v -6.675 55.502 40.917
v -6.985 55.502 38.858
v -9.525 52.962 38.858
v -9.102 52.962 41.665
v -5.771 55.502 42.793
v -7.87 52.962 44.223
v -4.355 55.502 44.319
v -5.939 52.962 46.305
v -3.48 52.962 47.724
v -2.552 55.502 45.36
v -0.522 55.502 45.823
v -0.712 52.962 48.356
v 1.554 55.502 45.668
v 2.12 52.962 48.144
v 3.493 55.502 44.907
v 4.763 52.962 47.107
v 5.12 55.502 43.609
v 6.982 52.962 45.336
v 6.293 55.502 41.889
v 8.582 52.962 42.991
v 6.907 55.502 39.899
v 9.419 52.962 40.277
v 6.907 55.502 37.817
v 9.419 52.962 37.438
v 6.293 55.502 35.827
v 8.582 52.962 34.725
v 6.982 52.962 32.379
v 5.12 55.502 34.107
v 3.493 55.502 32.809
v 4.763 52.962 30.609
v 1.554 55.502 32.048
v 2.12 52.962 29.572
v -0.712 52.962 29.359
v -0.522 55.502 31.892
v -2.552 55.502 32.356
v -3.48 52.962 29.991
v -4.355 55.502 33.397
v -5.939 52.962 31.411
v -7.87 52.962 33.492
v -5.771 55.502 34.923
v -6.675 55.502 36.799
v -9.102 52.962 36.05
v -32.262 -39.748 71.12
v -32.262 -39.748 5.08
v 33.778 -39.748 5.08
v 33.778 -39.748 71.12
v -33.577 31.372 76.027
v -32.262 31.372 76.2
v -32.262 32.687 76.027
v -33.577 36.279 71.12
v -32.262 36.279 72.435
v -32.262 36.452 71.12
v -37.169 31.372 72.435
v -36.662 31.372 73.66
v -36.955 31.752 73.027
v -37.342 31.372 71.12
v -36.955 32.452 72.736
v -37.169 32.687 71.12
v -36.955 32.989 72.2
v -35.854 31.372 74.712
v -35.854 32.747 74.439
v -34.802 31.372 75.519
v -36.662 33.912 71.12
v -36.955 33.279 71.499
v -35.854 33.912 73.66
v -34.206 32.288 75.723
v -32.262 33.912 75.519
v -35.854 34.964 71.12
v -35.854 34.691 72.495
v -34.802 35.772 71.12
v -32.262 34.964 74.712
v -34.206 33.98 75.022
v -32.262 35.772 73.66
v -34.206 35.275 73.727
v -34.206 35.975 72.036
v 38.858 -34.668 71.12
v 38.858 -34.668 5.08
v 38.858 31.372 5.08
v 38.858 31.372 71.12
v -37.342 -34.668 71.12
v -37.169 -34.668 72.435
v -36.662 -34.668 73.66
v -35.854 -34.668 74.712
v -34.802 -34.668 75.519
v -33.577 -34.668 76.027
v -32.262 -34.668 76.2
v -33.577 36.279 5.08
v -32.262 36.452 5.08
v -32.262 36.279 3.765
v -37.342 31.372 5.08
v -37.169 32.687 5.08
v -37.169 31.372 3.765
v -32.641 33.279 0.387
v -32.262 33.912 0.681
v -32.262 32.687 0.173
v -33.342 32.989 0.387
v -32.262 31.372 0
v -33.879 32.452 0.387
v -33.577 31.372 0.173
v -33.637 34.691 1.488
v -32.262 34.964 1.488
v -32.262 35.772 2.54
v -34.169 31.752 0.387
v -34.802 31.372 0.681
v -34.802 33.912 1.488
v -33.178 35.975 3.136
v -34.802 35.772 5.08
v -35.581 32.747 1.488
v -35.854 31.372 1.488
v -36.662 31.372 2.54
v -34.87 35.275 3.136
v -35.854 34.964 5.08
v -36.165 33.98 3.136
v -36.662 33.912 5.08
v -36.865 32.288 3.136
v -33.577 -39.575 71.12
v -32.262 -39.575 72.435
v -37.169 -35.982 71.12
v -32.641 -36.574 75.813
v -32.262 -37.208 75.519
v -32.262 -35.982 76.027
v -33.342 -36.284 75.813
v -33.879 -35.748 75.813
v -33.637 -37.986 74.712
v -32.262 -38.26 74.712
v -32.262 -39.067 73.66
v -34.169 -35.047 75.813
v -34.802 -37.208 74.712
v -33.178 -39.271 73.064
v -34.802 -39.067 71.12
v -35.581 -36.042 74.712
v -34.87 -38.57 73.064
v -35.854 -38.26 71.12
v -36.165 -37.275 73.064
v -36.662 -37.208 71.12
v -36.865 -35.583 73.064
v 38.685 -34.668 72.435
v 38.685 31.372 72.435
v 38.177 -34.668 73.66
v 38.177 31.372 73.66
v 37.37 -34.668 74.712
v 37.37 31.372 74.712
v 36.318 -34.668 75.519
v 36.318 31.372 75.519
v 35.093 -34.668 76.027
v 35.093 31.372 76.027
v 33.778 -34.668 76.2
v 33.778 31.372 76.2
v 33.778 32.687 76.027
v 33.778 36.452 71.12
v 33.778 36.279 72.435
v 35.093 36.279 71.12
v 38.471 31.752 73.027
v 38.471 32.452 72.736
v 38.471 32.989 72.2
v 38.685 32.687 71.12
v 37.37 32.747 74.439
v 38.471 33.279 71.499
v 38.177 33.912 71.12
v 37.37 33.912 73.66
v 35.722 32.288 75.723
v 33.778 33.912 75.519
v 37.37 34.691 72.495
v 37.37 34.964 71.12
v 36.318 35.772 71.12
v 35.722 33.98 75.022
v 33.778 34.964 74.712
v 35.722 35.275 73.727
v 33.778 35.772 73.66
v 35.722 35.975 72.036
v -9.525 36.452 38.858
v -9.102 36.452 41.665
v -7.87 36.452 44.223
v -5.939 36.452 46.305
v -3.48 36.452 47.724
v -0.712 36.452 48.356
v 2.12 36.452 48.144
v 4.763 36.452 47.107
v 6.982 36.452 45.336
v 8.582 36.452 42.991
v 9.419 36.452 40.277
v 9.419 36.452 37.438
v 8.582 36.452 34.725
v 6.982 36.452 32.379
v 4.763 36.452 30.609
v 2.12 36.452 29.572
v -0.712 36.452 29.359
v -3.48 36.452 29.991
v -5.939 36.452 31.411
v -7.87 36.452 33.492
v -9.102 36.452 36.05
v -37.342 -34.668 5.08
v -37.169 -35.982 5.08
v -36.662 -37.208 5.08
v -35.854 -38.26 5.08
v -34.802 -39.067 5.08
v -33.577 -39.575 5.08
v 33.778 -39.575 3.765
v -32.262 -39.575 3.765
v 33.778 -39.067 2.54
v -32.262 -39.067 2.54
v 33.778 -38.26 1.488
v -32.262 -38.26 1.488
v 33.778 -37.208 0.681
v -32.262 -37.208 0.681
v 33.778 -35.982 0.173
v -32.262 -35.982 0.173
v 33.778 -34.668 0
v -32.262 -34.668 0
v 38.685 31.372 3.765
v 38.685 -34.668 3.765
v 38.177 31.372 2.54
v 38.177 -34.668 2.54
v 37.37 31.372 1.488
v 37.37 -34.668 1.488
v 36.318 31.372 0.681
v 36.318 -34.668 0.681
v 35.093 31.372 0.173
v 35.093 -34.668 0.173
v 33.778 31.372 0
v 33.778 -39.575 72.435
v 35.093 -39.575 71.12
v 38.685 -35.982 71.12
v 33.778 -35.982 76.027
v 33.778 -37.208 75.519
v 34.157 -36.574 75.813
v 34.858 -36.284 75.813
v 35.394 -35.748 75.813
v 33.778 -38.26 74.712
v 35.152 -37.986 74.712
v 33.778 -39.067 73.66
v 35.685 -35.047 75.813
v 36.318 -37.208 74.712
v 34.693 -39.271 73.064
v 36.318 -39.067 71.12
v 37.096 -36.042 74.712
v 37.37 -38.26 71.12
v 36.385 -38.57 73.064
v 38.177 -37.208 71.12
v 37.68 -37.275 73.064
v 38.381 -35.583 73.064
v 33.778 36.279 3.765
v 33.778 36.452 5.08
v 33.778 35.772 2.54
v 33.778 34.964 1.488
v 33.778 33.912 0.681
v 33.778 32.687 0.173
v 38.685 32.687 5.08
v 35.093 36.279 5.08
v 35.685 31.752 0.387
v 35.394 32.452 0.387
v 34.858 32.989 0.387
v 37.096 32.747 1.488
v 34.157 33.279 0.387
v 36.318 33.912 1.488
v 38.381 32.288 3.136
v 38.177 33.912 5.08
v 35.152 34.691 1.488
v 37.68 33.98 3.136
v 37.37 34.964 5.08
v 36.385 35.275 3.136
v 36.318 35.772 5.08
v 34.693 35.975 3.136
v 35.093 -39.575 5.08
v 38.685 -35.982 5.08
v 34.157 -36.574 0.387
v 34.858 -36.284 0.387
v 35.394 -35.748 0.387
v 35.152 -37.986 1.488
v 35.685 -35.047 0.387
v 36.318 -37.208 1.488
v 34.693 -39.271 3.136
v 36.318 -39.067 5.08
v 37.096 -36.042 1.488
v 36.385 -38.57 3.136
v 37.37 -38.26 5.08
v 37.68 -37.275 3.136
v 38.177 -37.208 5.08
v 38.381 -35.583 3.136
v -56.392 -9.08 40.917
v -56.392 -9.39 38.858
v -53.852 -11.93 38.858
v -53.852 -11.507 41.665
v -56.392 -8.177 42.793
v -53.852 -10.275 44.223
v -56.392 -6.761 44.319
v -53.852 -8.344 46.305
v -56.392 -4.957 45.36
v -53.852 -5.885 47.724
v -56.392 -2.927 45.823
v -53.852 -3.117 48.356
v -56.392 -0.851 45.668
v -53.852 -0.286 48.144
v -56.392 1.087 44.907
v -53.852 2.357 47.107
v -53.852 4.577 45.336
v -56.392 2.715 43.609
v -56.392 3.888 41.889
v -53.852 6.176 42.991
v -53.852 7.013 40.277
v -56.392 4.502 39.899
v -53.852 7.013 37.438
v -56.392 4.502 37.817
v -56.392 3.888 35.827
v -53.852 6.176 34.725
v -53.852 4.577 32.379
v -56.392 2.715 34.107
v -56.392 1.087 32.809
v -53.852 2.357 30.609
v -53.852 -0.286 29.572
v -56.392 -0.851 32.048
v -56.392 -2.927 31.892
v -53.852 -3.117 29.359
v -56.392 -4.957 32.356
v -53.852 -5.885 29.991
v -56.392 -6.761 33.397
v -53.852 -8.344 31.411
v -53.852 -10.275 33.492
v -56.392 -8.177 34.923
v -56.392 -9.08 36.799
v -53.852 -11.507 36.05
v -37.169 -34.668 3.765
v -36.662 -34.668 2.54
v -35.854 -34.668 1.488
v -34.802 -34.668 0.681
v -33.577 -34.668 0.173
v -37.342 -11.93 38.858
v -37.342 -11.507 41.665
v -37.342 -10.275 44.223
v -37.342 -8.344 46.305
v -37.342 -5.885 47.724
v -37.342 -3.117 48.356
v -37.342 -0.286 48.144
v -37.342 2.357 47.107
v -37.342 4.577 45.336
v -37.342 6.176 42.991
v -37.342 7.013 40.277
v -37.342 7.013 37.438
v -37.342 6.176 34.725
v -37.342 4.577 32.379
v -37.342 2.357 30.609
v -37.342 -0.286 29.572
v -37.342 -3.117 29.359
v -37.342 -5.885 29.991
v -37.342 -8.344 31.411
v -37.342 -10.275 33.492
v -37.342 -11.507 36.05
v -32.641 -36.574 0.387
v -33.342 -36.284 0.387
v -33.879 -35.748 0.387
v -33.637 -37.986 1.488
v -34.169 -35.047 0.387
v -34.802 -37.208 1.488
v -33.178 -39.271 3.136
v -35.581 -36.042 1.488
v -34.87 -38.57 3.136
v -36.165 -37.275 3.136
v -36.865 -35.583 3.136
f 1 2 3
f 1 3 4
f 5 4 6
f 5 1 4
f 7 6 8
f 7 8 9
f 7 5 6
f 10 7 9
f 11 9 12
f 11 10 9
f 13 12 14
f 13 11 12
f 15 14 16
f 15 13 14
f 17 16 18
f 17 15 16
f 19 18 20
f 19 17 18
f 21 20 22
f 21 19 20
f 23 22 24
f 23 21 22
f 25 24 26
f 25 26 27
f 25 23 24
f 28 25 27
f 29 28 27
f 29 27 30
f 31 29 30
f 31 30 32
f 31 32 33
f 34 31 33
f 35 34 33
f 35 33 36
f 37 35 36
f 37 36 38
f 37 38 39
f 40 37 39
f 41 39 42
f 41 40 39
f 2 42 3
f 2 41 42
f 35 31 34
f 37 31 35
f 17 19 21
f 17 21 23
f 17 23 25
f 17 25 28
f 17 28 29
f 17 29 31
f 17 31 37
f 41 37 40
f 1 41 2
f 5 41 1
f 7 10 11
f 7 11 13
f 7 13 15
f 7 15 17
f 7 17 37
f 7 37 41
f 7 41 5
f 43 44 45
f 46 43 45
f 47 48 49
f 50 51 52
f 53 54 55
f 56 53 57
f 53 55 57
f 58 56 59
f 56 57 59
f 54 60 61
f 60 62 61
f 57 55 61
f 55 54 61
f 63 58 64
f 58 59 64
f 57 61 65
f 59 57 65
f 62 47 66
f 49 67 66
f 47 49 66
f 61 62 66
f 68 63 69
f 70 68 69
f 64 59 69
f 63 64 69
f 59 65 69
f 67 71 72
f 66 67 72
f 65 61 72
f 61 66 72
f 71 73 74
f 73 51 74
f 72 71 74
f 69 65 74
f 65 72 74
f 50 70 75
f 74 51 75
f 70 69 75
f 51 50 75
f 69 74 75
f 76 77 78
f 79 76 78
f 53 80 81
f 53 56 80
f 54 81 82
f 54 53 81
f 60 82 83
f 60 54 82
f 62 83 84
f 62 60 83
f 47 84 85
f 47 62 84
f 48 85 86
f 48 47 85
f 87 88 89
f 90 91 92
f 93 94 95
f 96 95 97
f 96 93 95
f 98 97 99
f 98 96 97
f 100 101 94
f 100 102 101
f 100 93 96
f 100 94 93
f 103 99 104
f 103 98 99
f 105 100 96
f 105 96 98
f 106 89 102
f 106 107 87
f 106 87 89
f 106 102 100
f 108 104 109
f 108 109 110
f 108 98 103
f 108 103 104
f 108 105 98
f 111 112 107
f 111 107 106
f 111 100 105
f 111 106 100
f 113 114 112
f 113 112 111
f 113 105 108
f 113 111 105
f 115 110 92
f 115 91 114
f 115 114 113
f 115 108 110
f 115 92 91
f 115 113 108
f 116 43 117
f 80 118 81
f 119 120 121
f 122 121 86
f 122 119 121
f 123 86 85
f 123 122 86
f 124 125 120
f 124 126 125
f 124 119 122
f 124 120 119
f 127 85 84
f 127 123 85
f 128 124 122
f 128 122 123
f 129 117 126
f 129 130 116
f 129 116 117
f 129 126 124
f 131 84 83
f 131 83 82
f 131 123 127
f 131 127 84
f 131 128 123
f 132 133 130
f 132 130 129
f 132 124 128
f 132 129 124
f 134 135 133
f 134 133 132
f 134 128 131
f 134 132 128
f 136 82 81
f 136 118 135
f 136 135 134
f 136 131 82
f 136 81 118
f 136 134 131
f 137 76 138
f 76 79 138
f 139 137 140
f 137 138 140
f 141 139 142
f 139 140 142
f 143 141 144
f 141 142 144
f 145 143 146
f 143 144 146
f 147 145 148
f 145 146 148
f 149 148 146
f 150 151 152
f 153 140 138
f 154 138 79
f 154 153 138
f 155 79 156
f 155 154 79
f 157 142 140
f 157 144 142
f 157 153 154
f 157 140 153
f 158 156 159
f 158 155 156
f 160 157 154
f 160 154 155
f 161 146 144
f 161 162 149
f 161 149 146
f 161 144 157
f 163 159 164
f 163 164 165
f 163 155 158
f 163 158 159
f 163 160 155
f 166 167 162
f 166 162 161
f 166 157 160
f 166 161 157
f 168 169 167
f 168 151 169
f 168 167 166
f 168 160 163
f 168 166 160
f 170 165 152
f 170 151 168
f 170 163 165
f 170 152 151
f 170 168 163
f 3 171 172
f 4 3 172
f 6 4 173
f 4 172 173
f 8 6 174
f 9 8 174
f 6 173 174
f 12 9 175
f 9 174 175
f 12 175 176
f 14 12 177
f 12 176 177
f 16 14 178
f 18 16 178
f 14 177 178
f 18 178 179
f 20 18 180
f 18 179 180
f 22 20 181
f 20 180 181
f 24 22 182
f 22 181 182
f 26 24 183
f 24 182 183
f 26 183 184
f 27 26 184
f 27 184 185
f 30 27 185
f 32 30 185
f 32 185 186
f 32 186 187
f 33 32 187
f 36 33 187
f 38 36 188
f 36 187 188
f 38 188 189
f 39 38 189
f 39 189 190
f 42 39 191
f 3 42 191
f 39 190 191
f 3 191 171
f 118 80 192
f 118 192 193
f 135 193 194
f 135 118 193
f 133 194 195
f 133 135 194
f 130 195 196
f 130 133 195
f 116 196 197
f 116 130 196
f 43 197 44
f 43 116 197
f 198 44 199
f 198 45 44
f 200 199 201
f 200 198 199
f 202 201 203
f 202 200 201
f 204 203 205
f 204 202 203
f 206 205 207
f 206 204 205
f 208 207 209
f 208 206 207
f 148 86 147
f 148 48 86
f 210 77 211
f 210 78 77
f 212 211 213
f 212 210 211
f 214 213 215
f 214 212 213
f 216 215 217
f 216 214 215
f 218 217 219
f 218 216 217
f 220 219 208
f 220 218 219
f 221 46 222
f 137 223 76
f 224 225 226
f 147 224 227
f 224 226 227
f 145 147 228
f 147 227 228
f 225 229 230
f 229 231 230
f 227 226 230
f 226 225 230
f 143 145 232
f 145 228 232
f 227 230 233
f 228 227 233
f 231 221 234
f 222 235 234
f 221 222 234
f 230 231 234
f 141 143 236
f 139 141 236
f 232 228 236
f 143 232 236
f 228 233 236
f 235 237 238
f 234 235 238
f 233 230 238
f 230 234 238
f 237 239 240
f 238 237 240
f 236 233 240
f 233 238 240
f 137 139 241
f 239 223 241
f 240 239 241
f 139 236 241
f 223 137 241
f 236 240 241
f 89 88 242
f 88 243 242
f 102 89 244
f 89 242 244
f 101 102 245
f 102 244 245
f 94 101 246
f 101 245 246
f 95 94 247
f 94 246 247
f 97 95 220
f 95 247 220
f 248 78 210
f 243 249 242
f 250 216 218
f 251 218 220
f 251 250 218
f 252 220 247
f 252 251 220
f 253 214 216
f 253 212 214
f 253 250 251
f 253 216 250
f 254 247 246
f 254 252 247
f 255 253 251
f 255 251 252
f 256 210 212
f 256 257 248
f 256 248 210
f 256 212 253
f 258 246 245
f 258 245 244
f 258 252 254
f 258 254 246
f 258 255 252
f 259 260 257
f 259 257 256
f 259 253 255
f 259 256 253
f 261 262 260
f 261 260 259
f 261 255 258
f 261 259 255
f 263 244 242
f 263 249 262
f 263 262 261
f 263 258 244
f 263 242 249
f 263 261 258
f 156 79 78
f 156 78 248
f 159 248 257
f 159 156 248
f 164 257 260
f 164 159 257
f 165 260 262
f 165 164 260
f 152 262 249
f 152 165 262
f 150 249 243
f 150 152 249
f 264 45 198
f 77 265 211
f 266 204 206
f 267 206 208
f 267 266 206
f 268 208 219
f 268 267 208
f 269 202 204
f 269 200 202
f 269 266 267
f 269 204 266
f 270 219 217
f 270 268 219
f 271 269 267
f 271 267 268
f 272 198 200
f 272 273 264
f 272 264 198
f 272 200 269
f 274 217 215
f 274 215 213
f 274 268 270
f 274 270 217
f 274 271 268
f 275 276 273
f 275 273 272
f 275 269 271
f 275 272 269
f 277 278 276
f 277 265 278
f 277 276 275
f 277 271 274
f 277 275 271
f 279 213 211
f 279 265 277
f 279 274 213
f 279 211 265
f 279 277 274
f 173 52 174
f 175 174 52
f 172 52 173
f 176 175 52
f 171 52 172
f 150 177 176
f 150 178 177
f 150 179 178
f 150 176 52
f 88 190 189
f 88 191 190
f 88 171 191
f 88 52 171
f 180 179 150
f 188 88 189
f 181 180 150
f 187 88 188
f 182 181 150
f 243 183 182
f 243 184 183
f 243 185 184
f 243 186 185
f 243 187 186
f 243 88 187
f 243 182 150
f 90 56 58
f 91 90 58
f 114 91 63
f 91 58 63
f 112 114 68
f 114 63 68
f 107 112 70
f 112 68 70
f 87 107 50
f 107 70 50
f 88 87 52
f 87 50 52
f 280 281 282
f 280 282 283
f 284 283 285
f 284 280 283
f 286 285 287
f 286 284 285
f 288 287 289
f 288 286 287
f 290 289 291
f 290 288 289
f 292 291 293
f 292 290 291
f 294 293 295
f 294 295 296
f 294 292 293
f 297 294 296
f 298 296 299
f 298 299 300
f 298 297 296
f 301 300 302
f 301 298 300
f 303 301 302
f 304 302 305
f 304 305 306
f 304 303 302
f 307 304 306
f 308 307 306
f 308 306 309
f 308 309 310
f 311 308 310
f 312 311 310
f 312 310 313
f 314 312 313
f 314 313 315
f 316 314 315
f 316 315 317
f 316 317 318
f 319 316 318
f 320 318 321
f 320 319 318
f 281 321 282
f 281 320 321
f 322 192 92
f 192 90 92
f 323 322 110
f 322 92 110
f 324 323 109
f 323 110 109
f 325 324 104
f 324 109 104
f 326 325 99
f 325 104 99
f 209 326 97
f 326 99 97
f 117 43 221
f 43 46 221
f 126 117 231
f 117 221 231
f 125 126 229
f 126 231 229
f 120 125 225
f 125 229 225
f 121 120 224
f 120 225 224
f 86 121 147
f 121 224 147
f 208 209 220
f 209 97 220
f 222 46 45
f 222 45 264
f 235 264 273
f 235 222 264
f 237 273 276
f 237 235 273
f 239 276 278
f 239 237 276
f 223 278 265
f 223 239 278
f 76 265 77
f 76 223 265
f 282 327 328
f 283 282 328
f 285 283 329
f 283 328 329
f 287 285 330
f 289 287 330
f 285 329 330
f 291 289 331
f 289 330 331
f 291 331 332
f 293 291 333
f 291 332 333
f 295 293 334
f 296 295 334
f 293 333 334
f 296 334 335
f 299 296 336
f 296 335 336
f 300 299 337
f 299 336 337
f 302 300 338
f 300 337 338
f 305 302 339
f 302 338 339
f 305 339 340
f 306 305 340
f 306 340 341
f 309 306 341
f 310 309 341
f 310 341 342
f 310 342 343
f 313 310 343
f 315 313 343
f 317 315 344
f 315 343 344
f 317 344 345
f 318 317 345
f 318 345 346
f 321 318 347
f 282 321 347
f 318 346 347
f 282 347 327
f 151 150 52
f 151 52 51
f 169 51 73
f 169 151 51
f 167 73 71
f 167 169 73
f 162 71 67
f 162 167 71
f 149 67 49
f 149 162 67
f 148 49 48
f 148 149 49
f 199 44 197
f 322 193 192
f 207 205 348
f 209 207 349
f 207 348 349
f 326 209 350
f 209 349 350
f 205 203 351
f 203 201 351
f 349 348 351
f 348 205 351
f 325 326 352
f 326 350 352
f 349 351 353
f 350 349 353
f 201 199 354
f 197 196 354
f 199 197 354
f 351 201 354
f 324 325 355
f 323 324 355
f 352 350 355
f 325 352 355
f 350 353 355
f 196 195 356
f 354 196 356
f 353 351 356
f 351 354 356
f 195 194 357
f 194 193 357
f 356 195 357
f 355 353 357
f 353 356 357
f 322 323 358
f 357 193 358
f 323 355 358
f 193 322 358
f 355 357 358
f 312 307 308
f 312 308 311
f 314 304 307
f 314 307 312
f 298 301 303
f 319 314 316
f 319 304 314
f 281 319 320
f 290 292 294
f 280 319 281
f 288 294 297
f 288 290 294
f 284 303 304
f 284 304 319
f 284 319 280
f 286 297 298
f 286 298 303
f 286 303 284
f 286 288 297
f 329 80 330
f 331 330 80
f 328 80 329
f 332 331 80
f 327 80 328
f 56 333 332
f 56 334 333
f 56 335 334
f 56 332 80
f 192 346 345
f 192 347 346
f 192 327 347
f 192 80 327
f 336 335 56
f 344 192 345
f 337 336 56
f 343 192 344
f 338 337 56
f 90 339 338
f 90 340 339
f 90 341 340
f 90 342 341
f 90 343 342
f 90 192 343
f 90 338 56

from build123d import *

# Parameters (mm, degrees)
F0_W     = 76.2
F0_H     = 76.2
F1_DEPTH = 76.2
F2_R     = 5.08
F3_R     = 9.525
F4_DEPTH = 19.05
F5_SIZE  = 2.54
F6_R     = 9.525
F7_DEPTH = 19.05
F8_SIZE  = 2.54


with BuildPart() as f1:
    # F0 (on Top) → F1 (new body)
    with BuildSketch(Plane.XY):
        with Locations((0.757823, -1.647639)):
            Rectangle(F0_W, F0_H)
    extrude(amount=F1_DEPTH)

    # F2
    f2_edges = [f1.edges().sort_by_distance(p)[0] for p in [
        (-37.342177, -39.747639, 38.1),
        (38.857823, -39.747639, 38.1),
        (0.757823, -39.747639, 0),
        (0.757823, -39.747639, 76.2),
        (0.757823, 36.452361, 76.2),
        (-37.342177, -1.647639, 76.2),
        (38.857823, -1.647639, 76.2),
        (38.857823, 36.452361, 38.1),
        (38.857823, -1.647639, 0),
        (-37.342177, 36.452361, 38.1),
        (0.757823, 36.452361, 0),
        (-37.342177, -1.647639, 0),
    ]]
    fillet(f2_edges, radius=F2_R)

    # F3 (on face) → F4 (join)
    with BuildSketch(Plane(origin=(0, 36.452361, 0), x_dir=(-1, 0, 0), z_dir=(0, 1, 0))):
        with Locations((0, 38.857823)):
            Circle(F3_R)
    extrude(amount=F4_DEPTH)

    # F5
    f5_edges = [f1.edges().sort_by_distance(p)[0] for p in [
        (9.525, 55.502361, 38.857823),
    ]]
    chamfer(f5_edges, length=F5_SIZE)

    # F6 (on face) → F7 (join)
    with BuildSketch(Plane(origin=(-37.342177, 0, 0), x_dir=(0, -1, 0), z_dir=(-1, 0, 0))):
        with Locations((2.405462, 38.857823)):
            Circle(F6_R)
    extrude(amount=F7_DEPTH)

    # F8
    f8_edges = [f1.edges().sort_by_distance(p)[0] for p in [
        (-56.392177, 7.119538, 38.857823),
    ]]
    chamfer(f8_edges, length=F8_SIZE)


solid = f1.part
